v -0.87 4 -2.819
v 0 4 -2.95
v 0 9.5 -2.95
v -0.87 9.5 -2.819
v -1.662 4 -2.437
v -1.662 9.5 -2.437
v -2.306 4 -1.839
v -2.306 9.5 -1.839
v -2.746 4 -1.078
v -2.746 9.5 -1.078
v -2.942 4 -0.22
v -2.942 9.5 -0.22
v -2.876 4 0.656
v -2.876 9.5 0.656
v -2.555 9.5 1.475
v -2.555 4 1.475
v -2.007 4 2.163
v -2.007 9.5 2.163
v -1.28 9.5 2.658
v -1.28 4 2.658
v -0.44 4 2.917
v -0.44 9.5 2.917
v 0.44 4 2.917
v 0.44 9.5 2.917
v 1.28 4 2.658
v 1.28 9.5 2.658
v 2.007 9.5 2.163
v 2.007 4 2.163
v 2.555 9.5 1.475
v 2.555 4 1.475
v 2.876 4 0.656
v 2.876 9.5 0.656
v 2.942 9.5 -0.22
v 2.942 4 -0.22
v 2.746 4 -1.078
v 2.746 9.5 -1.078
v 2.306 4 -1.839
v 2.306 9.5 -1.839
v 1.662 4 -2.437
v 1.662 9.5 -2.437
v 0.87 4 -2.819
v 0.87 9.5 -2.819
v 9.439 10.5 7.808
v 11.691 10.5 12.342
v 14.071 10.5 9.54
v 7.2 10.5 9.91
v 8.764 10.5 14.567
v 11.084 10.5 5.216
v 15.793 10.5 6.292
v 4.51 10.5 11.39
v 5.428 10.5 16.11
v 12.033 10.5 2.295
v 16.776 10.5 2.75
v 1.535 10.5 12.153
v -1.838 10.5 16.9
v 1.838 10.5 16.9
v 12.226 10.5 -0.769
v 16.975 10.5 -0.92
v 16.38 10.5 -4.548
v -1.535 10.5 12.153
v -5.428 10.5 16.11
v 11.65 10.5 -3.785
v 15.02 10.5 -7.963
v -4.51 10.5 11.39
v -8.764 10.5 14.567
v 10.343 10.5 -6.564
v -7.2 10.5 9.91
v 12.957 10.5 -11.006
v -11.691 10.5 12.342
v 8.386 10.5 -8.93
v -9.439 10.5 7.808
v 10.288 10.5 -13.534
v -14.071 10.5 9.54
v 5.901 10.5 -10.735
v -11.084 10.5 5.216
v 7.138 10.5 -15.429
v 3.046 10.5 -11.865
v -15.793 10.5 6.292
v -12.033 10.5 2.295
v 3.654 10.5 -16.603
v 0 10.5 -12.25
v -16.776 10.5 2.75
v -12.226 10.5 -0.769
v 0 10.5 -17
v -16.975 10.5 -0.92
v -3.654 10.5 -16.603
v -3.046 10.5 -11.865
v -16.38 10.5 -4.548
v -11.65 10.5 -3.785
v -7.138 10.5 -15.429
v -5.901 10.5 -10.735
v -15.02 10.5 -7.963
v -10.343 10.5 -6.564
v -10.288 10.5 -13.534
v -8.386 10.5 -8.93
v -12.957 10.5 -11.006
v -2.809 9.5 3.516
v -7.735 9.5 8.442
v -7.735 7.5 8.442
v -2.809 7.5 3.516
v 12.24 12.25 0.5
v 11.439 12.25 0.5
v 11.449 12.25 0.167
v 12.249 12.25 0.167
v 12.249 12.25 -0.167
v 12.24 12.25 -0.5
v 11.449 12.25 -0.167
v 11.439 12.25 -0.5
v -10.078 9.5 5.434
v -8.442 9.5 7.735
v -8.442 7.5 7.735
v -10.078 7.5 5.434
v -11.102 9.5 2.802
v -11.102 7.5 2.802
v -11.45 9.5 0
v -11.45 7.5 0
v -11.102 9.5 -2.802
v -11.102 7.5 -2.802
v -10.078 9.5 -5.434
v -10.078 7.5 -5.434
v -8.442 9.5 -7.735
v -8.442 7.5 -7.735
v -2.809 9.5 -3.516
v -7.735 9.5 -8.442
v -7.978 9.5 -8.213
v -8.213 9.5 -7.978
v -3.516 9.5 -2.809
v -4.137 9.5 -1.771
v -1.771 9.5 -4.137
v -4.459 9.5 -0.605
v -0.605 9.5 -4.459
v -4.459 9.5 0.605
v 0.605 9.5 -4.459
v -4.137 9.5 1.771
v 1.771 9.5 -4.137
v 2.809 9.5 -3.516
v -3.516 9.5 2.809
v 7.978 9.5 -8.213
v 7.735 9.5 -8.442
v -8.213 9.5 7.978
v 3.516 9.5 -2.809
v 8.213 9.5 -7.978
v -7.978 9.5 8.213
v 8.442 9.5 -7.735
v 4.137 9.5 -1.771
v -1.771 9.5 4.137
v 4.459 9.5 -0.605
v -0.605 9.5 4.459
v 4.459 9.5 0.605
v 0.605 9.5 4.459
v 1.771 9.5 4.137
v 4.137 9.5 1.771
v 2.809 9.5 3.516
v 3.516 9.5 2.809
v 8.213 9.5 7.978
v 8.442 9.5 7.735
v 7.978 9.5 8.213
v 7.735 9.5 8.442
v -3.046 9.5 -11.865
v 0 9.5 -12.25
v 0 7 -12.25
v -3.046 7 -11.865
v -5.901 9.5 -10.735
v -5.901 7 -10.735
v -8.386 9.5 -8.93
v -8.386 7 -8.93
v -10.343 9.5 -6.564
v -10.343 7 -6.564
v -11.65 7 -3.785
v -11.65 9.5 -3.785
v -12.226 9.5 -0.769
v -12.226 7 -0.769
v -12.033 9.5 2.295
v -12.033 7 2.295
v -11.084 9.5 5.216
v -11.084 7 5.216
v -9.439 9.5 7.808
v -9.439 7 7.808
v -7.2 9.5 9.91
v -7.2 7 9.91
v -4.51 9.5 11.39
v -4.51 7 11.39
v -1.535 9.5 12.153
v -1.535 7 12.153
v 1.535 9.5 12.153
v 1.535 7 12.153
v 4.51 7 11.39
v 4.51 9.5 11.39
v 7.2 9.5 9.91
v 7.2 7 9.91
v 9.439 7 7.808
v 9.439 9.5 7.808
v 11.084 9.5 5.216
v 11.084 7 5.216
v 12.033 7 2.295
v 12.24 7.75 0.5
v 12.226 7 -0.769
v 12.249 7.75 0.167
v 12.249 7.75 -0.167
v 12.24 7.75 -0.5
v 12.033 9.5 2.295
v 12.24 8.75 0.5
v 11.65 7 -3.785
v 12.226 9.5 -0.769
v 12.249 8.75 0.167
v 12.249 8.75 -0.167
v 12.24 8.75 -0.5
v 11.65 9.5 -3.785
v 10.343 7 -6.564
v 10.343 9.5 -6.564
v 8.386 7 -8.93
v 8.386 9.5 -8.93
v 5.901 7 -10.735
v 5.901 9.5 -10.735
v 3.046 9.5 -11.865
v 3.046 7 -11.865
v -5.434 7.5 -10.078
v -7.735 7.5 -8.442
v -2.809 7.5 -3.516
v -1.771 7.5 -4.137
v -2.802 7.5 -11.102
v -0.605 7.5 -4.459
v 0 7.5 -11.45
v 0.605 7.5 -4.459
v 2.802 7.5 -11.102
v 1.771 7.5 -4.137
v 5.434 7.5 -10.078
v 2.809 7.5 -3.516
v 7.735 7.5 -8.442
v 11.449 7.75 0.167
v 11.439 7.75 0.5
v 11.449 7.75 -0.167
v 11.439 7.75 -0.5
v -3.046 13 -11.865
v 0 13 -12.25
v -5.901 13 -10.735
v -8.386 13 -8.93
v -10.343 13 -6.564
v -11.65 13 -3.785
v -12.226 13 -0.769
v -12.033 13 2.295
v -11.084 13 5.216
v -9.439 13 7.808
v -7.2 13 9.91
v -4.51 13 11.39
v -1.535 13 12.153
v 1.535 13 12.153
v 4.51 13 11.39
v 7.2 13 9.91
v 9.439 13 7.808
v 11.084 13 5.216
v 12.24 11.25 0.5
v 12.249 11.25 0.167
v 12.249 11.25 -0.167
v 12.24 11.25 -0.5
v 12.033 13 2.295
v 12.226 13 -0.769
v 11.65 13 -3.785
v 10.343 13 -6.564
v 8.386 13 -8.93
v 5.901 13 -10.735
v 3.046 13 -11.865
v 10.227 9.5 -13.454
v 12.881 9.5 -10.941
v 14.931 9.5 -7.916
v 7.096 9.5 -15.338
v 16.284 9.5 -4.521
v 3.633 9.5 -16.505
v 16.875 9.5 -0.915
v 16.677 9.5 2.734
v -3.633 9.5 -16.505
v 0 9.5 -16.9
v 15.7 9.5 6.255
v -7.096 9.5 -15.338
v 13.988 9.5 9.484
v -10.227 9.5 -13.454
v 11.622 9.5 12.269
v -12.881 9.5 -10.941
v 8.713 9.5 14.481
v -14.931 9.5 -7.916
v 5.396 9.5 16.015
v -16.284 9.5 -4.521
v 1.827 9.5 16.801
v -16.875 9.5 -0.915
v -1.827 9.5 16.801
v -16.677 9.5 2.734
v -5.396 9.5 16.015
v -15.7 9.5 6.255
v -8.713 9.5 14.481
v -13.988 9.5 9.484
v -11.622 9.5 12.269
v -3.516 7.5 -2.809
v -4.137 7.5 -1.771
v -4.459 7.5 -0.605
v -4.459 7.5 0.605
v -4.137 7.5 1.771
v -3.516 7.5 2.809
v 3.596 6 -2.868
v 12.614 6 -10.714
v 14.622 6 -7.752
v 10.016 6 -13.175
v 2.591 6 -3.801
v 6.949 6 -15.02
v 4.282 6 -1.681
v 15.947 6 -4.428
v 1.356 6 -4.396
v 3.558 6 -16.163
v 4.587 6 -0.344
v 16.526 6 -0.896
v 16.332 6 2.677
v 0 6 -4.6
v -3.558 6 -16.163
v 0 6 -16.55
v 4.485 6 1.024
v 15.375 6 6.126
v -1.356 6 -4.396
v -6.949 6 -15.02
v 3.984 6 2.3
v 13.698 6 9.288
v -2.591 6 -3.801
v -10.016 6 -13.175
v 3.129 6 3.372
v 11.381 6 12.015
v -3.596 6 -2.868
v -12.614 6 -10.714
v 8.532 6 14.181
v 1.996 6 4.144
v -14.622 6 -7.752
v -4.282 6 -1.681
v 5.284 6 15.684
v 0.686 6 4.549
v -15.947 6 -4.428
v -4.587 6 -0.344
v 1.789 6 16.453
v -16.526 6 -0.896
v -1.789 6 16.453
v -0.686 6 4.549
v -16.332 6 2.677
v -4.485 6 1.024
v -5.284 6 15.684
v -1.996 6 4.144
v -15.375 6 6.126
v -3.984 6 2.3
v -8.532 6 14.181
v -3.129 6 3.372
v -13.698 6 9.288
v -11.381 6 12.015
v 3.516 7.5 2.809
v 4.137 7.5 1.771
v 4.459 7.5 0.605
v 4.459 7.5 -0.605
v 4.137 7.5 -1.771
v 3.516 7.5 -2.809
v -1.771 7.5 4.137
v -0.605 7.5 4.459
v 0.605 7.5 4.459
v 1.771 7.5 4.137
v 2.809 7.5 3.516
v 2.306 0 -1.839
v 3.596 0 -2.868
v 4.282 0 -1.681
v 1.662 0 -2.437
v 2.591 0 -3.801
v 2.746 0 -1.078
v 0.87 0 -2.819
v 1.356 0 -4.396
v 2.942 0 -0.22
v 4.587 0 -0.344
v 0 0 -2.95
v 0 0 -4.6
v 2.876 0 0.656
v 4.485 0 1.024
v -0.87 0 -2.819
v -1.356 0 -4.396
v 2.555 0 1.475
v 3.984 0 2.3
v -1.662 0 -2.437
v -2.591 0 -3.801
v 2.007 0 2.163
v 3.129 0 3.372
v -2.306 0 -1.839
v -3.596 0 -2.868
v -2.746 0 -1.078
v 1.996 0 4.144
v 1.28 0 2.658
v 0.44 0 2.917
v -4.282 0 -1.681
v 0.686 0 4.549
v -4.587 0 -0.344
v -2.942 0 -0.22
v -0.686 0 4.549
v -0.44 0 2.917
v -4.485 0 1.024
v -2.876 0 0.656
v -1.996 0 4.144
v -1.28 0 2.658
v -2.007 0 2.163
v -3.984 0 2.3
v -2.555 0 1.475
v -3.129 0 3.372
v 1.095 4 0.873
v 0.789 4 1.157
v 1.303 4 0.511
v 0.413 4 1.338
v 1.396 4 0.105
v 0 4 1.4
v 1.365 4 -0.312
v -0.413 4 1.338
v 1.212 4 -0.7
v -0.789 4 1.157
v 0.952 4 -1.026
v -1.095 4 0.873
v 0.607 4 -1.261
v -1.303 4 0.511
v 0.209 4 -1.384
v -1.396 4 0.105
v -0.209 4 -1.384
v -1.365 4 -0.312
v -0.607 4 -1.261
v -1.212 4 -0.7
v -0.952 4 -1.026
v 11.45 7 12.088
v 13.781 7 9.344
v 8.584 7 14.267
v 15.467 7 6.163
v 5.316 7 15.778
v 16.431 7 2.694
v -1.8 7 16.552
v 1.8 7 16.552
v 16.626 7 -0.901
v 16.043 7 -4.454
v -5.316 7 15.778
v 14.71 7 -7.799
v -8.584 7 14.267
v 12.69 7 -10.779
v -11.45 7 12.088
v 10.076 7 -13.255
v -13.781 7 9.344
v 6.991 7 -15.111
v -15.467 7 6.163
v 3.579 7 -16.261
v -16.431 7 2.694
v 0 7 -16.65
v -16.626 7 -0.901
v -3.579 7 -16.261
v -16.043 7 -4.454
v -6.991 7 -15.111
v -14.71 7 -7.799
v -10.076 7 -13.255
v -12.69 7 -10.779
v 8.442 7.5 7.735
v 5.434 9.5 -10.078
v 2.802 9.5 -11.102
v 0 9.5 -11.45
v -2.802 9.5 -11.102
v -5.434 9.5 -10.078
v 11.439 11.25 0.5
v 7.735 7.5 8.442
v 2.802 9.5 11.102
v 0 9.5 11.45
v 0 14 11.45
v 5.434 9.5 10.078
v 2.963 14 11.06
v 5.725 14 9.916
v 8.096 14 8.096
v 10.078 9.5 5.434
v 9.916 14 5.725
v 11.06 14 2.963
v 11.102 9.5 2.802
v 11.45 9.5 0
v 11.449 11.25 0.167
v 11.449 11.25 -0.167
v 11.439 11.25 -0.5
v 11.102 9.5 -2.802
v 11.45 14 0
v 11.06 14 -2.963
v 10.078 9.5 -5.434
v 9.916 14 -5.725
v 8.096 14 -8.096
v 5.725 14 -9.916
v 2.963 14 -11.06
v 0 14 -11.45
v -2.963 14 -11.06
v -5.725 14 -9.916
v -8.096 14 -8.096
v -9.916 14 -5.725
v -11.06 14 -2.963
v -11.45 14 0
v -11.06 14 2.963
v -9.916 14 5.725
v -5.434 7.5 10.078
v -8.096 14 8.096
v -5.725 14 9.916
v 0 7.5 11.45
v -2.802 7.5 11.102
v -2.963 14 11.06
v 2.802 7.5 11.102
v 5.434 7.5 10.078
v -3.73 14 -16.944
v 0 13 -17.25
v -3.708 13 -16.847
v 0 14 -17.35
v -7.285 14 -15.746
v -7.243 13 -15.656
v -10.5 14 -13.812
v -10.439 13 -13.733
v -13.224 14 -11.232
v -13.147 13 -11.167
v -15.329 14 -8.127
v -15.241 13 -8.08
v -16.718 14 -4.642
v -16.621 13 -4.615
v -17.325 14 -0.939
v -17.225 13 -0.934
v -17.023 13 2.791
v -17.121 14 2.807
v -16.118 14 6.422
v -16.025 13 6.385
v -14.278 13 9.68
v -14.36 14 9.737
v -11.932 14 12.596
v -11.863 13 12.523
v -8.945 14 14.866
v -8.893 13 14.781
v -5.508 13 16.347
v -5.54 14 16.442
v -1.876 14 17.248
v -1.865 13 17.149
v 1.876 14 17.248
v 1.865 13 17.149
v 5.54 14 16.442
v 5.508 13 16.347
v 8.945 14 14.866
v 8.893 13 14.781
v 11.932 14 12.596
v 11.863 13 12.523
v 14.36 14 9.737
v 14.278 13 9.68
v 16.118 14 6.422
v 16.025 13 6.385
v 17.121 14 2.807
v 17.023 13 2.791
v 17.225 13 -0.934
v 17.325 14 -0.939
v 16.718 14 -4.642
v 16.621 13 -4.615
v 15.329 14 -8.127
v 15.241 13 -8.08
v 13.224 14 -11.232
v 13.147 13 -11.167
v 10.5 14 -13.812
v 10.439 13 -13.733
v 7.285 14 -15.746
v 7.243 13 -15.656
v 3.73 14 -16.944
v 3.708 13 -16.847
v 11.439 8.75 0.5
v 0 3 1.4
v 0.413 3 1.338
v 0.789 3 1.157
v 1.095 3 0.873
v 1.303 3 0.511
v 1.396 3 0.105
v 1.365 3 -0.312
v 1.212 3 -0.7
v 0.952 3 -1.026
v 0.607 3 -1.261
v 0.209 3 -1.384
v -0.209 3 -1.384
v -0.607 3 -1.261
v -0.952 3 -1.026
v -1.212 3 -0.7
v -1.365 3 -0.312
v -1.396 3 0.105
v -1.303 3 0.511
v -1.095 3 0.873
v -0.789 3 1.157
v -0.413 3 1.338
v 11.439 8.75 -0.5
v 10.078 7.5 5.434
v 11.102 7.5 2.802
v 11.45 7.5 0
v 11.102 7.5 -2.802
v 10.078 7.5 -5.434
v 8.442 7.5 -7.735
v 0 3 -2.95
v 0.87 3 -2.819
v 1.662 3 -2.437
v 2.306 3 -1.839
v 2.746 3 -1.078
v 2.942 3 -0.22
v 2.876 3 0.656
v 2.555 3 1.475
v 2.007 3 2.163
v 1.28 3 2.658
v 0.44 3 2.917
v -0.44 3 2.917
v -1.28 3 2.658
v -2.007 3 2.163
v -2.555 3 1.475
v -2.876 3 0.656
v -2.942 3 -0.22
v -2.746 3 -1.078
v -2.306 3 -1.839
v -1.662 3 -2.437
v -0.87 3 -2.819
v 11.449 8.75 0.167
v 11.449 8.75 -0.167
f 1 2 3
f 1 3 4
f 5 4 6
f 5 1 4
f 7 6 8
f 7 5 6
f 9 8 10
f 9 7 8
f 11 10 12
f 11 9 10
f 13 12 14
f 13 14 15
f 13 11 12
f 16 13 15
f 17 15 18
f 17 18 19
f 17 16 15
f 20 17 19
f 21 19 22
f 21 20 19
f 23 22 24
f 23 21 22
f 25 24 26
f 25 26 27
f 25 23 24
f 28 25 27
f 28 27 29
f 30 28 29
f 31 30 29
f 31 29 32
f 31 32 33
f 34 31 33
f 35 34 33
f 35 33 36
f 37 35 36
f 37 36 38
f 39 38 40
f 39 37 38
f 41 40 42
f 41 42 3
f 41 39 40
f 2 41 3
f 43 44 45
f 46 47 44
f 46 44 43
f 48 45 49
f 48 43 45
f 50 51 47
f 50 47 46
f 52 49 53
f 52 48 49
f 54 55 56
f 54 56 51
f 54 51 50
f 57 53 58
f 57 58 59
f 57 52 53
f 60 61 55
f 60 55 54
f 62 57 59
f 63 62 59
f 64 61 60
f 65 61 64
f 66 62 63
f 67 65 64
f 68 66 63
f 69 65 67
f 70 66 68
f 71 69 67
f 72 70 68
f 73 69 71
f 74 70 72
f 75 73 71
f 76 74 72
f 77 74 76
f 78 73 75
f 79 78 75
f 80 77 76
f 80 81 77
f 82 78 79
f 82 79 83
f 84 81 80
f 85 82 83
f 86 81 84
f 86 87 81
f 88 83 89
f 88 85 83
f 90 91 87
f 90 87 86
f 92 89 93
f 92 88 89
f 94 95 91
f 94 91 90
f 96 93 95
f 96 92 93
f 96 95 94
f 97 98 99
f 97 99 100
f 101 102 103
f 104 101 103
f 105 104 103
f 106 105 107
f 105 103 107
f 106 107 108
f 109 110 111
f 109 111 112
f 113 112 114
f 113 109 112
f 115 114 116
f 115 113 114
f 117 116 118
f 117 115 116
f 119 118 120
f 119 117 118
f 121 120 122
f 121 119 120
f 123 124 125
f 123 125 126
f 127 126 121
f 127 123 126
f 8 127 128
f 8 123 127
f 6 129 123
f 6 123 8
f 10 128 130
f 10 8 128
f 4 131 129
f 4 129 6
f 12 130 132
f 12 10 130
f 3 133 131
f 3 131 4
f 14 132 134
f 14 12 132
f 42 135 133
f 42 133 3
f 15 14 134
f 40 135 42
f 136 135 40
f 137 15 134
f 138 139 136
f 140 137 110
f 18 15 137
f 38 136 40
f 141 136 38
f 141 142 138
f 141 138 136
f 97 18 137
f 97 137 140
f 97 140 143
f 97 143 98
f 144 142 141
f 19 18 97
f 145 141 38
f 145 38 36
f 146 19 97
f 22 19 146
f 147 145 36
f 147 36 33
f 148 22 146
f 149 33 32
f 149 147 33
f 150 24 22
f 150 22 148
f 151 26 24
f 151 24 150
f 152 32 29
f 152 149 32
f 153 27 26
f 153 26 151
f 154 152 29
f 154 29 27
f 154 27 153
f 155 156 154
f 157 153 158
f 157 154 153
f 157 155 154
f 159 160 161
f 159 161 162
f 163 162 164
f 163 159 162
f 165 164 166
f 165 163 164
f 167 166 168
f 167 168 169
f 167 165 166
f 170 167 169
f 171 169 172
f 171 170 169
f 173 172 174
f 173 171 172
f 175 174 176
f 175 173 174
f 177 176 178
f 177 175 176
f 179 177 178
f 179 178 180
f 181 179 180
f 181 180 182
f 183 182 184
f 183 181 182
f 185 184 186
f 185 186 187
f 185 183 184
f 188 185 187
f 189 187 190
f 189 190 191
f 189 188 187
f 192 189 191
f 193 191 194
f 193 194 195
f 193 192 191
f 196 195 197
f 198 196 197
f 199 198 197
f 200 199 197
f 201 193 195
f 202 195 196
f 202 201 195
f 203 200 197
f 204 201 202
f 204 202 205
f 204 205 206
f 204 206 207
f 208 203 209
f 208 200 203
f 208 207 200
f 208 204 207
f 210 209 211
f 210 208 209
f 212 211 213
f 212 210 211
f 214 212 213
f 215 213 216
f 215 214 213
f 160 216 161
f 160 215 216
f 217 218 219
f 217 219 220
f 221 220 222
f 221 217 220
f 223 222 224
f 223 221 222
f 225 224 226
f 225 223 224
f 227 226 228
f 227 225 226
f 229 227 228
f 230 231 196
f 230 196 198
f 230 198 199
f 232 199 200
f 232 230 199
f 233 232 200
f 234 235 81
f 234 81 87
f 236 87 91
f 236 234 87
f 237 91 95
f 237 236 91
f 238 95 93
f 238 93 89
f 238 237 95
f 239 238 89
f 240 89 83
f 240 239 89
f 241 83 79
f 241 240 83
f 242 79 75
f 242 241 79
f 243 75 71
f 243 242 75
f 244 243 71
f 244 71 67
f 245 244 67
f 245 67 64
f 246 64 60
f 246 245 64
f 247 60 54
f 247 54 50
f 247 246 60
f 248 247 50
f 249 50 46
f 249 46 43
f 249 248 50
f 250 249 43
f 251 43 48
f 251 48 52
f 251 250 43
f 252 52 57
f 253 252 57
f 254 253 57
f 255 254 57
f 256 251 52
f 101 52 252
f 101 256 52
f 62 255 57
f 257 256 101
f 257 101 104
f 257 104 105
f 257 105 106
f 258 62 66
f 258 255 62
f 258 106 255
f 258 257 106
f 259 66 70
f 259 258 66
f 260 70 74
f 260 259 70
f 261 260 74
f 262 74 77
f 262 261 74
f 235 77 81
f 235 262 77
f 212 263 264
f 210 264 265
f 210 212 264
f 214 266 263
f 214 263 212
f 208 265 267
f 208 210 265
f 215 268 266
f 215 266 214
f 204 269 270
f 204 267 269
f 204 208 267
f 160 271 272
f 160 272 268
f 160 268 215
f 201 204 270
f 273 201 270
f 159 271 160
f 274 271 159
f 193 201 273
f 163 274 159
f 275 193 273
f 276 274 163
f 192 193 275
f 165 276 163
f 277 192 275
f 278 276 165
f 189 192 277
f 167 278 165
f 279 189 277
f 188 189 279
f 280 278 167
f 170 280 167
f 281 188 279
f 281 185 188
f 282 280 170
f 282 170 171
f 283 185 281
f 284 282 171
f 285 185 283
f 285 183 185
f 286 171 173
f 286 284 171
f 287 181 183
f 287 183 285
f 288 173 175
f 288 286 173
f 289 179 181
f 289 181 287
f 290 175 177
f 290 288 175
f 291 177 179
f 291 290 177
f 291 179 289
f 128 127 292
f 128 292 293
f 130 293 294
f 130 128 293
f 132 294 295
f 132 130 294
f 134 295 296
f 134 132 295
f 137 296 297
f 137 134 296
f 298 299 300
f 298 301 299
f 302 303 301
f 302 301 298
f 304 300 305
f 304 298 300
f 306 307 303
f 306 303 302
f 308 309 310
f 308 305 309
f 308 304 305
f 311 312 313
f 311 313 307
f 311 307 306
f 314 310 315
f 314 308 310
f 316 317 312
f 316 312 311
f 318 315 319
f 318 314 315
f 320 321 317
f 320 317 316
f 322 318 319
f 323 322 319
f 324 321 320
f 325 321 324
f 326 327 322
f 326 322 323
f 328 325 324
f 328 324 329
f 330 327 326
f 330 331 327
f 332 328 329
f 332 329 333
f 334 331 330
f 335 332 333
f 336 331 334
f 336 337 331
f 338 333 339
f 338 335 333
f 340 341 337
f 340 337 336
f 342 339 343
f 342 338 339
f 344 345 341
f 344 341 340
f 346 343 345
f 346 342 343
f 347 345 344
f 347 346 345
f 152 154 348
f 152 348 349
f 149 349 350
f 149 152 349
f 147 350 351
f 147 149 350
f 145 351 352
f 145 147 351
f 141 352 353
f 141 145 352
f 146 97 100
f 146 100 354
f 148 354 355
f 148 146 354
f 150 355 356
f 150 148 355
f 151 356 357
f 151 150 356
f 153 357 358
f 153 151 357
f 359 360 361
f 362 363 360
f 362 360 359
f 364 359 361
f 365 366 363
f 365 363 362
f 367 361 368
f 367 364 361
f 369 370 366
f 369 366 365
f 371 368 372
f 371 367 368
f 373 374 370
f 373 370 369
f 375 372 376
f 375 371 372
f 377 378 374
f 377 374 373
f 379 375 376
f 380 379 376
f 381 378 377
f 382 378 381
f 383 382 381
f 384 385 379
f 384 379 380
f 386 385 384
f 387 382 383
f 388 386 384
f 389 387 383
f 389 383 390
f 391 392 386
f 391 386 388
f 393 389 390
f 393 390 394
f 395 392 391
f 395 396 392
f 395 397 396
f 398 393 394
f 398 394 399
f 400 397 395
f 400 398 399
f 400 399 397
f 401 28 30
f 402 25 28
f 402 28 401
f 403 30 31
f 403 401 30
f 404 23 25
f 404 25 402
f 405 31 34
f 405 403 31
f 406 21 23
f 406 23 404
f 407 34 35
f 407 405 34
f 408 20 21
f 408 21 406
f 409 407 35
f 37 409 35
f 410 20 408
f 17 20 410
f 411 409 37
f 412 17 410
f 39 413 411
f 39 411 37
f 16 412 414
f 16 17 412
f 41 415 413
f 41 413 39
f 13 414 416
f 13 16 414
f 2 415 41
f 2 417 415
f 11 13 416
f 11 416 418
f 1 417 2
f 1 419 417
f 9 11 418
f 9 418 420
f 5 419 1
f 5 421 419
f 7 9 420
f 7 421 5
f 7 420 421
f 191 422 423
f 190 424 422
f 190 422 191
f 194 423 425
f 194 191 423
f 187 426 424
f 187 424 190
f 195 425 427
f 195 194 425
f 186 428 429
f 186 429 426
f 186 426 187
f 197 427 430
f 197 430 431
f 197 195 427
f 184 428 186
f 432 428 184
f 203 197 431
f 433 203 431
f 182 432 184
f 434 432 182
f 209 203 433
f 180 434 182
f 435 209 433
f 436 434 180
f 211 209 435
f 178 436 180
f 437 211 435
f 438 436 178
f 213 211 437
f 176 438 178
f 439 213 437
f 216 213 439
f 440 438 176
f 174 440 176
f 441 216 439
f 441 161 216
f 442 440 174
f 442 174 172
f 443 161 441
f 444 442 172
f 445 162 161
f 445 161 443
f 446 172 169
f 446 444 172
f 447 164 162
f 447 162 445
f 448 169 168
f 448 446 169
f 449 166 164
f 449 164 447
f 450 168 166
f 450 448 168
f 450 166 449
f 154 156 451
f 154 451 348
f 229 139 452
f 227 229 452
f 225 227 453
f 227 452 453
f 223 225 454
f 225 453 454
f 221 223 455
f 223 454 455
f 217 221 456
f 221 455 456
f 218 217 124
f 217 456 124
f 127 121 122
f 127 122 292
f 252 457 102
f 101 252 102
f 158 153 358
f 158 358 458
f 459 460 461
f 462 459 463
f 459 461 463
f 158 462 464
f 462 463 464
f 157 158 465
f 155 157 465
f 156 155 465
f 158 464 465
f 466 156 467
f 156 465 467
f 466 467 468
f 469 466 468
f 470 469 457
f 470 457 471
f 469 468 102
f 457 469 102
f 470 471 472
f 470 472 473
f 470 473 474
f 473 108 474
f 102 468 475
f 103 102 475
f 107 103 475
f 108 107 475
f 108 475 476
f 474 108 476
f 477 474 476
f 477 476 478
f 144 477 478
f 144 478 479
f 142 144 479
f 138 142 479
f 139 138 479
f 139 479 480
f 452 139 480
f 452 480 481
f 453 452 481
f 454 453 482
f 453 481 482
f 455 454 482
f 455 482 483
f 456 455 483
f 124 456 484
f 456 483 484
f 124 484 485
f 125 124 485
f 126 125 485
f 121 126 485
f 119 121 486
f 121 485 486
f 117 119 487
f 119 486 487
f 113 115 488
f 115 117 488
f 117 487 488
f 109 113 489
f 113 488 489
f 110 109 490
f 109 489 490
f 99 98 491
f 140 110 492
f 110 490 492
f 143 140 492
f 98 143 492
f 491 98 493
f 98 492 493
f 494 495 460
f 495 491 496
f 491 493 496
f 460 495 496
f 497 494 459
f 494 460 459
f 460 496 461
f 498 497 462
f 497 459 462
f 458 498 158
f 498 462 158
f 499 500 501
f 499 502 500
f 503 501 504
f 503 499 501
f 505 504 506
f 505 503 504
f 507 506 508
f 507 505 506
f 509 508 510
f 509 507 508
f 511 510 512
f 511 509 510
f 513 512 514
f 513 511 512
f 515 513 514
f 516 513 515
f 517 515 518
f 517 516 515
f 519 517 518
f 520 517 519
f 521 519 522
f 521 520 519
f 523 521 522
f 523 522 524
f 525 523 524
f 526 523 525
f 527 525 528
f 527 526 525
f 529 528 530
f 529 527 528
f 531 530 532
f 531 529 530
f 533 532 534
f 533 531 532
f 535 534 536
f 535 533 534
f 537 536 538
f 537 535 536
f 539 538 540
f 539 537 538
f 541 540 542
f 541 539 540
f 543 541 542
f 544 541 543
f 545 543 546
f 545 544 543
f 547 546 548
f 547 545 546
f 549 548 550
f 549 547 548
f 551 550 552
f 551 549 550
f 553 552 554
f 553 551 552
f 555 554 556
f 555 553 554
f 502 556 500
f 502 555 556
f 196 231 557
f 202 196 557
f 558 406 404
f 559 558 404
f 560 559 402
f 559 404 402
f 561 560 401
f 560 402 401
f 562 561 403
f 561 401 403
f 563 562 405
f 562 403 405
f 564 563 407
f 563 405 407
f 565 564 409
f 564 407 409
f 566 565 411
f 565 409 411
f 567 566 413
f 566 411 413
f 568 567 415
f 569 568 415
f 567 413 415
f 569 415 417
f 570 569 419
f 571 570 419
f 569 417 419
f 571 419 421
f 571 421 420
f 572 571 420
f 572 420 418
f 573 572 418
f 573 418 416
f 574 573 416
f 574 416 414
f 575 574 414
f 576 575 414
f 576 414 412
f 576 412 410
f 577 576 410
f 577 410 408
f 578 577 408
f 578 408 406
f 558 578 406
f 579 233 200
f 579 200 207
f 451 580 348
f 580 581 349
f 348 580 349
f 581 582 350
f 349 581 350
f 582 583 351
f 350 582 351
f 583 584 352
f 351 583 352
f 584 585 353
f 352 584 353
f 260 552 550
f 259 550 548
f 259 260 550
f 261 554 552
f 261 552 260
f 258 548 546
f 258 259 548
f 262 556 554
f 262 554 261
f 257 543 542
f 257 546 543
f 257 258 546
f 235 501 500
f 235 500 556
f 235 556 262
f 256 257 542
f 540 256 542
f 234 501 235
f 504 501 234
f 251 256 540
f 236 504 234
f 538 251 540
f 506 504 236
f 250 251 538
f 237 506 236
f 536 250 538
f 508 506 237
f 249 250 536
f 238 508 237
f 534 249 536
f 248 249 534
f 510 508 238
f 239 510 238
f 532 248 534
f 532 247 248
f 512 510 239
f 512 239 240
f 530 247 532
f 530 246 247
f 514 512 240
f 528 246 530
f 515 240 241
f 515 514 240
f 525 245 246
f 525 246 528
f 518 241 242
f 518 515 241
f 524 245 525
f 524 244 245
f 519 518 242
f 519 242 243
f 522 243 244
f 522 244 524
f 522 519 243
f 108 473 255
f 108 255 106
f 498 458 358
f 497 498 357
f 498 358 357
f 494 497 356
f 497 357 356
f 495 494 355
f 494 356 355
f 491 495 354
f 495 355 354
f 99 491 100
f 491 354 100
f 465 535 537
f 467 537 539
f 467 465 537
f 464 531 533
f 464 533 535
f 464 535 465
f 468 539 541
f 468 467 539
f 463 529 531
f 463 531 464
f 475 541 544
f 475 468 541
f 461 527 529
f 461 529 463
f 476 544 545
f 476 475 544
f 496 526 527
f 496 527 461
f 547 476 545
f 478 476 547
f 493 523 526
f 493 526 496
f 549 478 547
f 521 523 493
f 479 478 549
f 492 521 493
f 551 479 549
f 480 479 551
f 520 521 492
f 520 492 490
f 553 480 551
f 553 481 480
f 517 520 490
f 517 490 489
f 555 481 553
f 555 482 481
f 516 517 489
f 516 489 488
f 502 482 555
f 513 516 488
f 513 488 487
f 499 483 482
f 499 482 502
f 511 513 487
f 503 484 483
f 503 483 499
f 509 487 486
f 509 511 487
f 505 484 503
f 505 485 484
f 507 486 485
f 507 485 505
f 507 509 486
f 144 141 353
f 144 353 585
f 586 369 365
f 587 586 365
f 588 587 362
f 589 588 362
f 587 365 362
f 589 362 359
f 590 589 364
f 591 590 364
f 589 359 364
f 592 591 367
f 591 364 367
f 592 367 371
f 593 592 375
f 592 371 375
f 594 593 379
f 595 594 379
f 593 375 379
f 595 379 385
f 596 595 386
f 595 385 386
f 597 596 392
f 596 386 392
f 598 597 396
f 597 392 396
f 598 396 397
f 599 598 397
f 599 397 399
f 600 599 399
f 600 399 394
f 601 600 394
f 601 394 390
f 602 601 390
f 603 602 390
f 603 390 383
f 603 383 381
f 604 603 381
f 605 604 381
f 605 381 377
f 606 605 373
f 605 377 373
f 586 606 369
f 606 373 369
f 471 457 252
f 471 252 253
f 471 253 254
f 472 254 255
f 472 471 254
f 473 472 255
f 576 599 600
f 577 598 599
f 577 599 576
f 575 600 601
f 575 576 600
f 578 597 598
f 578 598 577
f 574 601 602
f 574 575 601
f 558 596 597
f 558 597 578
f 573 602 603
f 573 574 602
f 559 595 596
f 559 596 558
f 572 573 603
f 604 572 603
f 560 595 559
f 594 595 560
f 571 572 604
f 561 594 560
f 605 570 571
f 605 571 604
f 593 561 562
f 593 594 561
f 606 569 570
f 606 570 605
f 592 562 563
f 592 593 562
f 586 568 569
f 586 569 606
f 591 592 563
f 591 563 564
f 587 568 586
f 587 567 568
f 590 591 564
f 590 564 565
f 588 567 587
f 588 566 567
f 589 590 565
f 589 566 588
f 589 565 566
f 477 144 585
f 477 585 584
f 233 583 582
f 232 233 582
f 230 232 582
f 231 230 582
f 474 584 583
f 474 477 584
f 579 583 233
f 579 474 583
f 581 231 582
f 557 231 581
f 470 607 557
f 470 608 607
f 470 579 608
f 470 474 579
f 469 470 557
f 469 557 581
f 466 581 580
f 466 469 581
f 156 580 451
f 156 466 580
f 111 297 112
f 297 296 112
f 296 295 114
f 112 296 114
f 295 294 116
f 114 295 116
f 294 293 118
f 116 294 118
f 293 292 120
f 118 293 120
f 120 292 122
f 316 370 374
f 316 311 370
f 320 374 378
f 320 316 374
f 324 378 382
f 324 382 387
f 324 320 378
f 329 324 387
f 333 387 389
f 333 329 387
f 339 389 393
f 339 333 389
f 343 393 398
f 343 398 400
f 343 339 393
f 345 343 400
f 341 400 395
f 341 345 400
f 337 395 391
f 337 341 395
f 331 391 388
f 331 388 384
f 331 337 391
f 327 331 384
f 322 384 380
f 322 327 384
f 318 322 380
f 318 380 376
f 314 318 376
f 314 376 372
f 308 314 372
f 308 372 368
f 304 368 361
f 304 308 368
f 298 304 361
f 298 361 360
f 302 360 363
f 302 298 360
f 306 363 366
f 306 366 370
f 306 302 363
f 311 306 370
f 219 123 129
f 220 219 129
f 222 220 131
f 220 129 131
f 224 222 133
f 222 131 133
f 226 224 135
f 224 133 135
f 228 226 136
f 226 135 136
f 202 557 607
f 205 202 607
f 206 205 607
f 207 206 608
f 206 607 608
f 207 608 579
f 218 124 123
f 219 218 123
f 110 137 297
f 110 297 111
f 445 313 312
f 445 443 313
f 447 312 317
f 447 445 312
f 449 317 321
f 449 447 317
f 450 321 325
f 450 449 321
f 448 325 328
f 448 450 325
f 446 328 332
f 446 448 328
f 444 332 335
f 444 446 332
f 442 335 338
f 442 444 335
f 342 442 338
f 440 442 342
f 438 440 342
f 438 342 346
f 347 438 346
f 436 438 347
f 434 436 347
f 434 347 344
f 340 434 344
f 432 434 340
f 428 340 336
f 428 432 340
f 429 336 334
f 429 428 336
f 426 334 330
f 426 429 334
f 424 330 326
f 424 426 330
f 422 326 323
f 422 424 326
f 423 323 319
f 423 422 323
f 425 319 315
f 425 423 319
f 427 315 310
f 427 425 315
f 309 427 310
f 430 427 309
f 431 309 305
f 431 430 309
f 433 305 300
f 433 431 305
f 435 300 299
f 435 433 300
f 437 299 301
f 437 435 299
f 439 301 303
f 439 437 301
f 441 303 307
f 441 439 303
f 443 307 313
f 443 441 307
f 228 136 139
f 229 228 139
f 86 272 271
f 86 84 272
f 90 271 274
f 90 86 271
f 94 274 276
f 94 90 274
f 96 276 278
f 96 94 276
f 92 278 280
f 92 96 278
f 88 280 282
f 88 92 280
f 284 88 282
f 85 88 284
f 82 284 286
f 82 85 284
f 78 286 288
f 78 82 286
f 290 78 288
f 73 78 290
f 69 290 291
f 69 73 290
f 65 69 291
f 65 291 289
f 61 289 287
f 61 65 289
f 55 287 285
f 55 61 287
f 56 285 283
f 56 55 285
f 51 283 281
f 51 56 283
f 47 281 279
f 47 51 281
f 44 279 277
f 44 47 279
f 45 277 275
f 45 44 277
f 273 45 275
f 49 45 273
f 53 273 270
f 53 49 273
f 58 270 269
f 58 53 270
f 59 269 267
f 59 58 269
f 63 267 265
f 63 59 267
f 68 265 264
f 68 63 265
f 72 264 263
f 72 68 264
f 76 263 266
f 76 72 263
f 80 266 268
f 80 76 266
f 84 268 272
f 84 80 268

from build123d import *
from build123d.topology import SkipClean

# Parameters (mm, degrees)
ESQUISSE2_R              = 2.95
ENL_V_MAT_EXTRU_1_DEPTH  = 3
ESQUISSE3_R              = 11.45
ENL_V_MAT_EXTRU_2_DEPTH  = 4.5
ENL_V_MAT_EXTRU_11_DEPTH = 2
ENL_V_START              = -5.5
ESQUISSE4_R              = 2.95
ENL_V_MAT_EXTRU_3_DEPTH  = 5.5
ESQUISSE6_R              = 1.4
ENL_V_MAT_EXTRU_9_DEPTH  = 27.496131793
ENL_V_START_2            = 5
ESQUISSE7_W              = 1
ESQUISSE7_H              = 1
ENL_V_MAT_EXTRU_10_DEPTH = 24.249690264


with BuildPart() as part:
    # Esquisse1 → Révolution1 (revolve)
    with BuildSketch(Plane.XY, mode=Mode.PRIVATE) as r_volution1_sk:
        Polygon((0, 0), (4.6, 0), (4.6, 6), (16.55, 6), (16.65, 7), (12.25, 7), (12.25, 9.5), (16.9, 9.5), (17, 10.5), (12.25, 10.5), (12.25, 13), (17.25, 13), (17.35, 14), (0, 14), align=None)
    revolve(r_volution1_sk.sketch.rotate(Axis((0, 0, 0), (0, 1, 0)), 90), axis=Axis((0, 0, 0), (0, 1, 0)))

    # Esquisse2 → Enlèv. mat.-Extru.1 (cut)
    with BuildSketch(Plane.XZ):
        with Locations(Location((0, 0, 0), (0, 0, 270))):
            Circle(ESQUISSE2_R)
    extrude(amount=-ENL_V_MAT_EXTRU_1_DEPTH, mode=Mode.SUBTRACT)

    # Esquisse3 → Enlèv. mat.-Extru.2 (cut)
    with BuildSketch(Plane(origin=(0, 14, 0), x_dir=(1, 0, 0), z_dir=(0, 1, 0))):
        with Locations(Location((0, 0, 0), (0, 0, 270))):
            Circle(ESQUISSE3_R)
    extrude(amount=-ENL_V_MAT_EXTRU_2_DEPTH, mode=Mode.SUBTRACT)

    # Esquisse8 → Enlèv. mat.-Extru.11 (cut)
    with SkipClean():  # the faces are left unmerged after this step: merging them gives an invalid solid
        with BuildSketch(Plane(origin=(0, 9.5, 0), x_dir=(1, 0, 0), z_dir=(0, 1, 0))):
            with BuildLine():
                Line((2.80872427, 3.515831051), (7.735096064, 8.442202845))
                ThreePointArc((7.735096064, 8.442202845), (0, 11.45), (-7.735096064, 8.442202845))
                Line((-7.735096064, 8.442202845), (-2.80872427, 3.515831051))
                ThreePointArc((-2.80872427, 3.515831051), (0, 4.5), (2.80872427, 3.515831051))
            make_face()
            with BuildLine():
                Line((3.515831051, 2.80872427), (8.442202845, 7.735096064))
                ThreePointArc((8.442202845, 7.735096064), (11.45, 0), (8.442202845, -7.735096064))
                Line((8.442202845, -7.735096064), (3.515831051, -2.80872427))
                ThreePointArc((3.515831051, -2.80872427), (4.5, 0), (3.515831051, 2.80872427))
            make_face()
            with BuildLine():
                Line((2.80872427, -3.515831051), (7.735096064, -8.442202845))
                ThreePointArc((7.735096064, -8.442202845), (0, -11.45), (-7.735096064, -8.442202845))
                Line((-7.735096064, -8.442202845), (-2.80872427, -3.515831051))
                ThreePointArc((-2.80872427, -3.515831051), (0, -4.5), (2.80872427, -3.515831051))
            make_face()
            with BuildLine():
                Line((-3.515831051, -2.80872427), (-8.442202845, -7.735096064))
                ThreePointArc((-8.442202845, -7.735096064), (-11.45, 0), (-8.442202845, 7.735096064))
                Line((-8.442202845, 7.735096064), (-3.515831051, 2.80872427))
                ThreePointArc((-3.515831051, 2.80872427), (-4.5, 0), (-3.515831051, -2.80872427))
            make_face()
        extrude(amount=-ENL_V_MAT_EXTRU_11_DEPTH, mode=Mode.SUBTRACT)

    # Esquisse4 → Enlèv. mat.-Extru.3 (cut)
    with SkipClean():  # the faces are left unmerged after this step: merging them gives an invalid solid
        with BuildSketch(Plane(origin=(0, 9.5, 0), x_dir=(1, 0, 0), z_dir=(0, 1, 0)).offset(ENL_V_START)):
            with Locations(Location((0, 0, 0), (0, 0, 90))):
                Circle(ESQUISSE4_R)
        extrude(amount=ENL_V_MAT_EXTRU_3_DEPTH, mode=Mode.SUBTRACT)

    # Esquisse6 → Enlèv. mat.-Extru.9 (cut, through all)
    with SkipClean():  # the faces are left unmerged after this step: merging them gives an invalid solid
        with BuildSketch(Plane(origin=(0, 4, 0), x_dir=(1, 0, 0), z_dir=(0, 1, 0))):
            with Locations(Location((0, 0, 0), (0, 0, 270))):
                Circle(ESQUISSE6_R)
        extrude(amount=-ENL_V_MAT_EXTRU_9_DEPTH, mode=Mode.SUBTRACT)

    # Esquisse7 → Enlèv. mat.-Extru.10 (cut, through all)
    with BuildSketch(Plane(origin=(0, 0, 0), x_dir=(0, 0, -1), z_dir=(1, 0, 0)).offset(ENL_V_START_2)):
        with Locations((0, 11.75)):
            Rectangle(ESQUISSE7_W, ESQUISSE7_H)
        with Locations((0, 8.25)):
            Rectangle(ESQUISSE7_W, ESQUISSE7_H)
    extrude(amount=ENL_V_MAT_EXTRU_10_DEPTH, mode=Mode.SUBTRACT)


solid = part.part
